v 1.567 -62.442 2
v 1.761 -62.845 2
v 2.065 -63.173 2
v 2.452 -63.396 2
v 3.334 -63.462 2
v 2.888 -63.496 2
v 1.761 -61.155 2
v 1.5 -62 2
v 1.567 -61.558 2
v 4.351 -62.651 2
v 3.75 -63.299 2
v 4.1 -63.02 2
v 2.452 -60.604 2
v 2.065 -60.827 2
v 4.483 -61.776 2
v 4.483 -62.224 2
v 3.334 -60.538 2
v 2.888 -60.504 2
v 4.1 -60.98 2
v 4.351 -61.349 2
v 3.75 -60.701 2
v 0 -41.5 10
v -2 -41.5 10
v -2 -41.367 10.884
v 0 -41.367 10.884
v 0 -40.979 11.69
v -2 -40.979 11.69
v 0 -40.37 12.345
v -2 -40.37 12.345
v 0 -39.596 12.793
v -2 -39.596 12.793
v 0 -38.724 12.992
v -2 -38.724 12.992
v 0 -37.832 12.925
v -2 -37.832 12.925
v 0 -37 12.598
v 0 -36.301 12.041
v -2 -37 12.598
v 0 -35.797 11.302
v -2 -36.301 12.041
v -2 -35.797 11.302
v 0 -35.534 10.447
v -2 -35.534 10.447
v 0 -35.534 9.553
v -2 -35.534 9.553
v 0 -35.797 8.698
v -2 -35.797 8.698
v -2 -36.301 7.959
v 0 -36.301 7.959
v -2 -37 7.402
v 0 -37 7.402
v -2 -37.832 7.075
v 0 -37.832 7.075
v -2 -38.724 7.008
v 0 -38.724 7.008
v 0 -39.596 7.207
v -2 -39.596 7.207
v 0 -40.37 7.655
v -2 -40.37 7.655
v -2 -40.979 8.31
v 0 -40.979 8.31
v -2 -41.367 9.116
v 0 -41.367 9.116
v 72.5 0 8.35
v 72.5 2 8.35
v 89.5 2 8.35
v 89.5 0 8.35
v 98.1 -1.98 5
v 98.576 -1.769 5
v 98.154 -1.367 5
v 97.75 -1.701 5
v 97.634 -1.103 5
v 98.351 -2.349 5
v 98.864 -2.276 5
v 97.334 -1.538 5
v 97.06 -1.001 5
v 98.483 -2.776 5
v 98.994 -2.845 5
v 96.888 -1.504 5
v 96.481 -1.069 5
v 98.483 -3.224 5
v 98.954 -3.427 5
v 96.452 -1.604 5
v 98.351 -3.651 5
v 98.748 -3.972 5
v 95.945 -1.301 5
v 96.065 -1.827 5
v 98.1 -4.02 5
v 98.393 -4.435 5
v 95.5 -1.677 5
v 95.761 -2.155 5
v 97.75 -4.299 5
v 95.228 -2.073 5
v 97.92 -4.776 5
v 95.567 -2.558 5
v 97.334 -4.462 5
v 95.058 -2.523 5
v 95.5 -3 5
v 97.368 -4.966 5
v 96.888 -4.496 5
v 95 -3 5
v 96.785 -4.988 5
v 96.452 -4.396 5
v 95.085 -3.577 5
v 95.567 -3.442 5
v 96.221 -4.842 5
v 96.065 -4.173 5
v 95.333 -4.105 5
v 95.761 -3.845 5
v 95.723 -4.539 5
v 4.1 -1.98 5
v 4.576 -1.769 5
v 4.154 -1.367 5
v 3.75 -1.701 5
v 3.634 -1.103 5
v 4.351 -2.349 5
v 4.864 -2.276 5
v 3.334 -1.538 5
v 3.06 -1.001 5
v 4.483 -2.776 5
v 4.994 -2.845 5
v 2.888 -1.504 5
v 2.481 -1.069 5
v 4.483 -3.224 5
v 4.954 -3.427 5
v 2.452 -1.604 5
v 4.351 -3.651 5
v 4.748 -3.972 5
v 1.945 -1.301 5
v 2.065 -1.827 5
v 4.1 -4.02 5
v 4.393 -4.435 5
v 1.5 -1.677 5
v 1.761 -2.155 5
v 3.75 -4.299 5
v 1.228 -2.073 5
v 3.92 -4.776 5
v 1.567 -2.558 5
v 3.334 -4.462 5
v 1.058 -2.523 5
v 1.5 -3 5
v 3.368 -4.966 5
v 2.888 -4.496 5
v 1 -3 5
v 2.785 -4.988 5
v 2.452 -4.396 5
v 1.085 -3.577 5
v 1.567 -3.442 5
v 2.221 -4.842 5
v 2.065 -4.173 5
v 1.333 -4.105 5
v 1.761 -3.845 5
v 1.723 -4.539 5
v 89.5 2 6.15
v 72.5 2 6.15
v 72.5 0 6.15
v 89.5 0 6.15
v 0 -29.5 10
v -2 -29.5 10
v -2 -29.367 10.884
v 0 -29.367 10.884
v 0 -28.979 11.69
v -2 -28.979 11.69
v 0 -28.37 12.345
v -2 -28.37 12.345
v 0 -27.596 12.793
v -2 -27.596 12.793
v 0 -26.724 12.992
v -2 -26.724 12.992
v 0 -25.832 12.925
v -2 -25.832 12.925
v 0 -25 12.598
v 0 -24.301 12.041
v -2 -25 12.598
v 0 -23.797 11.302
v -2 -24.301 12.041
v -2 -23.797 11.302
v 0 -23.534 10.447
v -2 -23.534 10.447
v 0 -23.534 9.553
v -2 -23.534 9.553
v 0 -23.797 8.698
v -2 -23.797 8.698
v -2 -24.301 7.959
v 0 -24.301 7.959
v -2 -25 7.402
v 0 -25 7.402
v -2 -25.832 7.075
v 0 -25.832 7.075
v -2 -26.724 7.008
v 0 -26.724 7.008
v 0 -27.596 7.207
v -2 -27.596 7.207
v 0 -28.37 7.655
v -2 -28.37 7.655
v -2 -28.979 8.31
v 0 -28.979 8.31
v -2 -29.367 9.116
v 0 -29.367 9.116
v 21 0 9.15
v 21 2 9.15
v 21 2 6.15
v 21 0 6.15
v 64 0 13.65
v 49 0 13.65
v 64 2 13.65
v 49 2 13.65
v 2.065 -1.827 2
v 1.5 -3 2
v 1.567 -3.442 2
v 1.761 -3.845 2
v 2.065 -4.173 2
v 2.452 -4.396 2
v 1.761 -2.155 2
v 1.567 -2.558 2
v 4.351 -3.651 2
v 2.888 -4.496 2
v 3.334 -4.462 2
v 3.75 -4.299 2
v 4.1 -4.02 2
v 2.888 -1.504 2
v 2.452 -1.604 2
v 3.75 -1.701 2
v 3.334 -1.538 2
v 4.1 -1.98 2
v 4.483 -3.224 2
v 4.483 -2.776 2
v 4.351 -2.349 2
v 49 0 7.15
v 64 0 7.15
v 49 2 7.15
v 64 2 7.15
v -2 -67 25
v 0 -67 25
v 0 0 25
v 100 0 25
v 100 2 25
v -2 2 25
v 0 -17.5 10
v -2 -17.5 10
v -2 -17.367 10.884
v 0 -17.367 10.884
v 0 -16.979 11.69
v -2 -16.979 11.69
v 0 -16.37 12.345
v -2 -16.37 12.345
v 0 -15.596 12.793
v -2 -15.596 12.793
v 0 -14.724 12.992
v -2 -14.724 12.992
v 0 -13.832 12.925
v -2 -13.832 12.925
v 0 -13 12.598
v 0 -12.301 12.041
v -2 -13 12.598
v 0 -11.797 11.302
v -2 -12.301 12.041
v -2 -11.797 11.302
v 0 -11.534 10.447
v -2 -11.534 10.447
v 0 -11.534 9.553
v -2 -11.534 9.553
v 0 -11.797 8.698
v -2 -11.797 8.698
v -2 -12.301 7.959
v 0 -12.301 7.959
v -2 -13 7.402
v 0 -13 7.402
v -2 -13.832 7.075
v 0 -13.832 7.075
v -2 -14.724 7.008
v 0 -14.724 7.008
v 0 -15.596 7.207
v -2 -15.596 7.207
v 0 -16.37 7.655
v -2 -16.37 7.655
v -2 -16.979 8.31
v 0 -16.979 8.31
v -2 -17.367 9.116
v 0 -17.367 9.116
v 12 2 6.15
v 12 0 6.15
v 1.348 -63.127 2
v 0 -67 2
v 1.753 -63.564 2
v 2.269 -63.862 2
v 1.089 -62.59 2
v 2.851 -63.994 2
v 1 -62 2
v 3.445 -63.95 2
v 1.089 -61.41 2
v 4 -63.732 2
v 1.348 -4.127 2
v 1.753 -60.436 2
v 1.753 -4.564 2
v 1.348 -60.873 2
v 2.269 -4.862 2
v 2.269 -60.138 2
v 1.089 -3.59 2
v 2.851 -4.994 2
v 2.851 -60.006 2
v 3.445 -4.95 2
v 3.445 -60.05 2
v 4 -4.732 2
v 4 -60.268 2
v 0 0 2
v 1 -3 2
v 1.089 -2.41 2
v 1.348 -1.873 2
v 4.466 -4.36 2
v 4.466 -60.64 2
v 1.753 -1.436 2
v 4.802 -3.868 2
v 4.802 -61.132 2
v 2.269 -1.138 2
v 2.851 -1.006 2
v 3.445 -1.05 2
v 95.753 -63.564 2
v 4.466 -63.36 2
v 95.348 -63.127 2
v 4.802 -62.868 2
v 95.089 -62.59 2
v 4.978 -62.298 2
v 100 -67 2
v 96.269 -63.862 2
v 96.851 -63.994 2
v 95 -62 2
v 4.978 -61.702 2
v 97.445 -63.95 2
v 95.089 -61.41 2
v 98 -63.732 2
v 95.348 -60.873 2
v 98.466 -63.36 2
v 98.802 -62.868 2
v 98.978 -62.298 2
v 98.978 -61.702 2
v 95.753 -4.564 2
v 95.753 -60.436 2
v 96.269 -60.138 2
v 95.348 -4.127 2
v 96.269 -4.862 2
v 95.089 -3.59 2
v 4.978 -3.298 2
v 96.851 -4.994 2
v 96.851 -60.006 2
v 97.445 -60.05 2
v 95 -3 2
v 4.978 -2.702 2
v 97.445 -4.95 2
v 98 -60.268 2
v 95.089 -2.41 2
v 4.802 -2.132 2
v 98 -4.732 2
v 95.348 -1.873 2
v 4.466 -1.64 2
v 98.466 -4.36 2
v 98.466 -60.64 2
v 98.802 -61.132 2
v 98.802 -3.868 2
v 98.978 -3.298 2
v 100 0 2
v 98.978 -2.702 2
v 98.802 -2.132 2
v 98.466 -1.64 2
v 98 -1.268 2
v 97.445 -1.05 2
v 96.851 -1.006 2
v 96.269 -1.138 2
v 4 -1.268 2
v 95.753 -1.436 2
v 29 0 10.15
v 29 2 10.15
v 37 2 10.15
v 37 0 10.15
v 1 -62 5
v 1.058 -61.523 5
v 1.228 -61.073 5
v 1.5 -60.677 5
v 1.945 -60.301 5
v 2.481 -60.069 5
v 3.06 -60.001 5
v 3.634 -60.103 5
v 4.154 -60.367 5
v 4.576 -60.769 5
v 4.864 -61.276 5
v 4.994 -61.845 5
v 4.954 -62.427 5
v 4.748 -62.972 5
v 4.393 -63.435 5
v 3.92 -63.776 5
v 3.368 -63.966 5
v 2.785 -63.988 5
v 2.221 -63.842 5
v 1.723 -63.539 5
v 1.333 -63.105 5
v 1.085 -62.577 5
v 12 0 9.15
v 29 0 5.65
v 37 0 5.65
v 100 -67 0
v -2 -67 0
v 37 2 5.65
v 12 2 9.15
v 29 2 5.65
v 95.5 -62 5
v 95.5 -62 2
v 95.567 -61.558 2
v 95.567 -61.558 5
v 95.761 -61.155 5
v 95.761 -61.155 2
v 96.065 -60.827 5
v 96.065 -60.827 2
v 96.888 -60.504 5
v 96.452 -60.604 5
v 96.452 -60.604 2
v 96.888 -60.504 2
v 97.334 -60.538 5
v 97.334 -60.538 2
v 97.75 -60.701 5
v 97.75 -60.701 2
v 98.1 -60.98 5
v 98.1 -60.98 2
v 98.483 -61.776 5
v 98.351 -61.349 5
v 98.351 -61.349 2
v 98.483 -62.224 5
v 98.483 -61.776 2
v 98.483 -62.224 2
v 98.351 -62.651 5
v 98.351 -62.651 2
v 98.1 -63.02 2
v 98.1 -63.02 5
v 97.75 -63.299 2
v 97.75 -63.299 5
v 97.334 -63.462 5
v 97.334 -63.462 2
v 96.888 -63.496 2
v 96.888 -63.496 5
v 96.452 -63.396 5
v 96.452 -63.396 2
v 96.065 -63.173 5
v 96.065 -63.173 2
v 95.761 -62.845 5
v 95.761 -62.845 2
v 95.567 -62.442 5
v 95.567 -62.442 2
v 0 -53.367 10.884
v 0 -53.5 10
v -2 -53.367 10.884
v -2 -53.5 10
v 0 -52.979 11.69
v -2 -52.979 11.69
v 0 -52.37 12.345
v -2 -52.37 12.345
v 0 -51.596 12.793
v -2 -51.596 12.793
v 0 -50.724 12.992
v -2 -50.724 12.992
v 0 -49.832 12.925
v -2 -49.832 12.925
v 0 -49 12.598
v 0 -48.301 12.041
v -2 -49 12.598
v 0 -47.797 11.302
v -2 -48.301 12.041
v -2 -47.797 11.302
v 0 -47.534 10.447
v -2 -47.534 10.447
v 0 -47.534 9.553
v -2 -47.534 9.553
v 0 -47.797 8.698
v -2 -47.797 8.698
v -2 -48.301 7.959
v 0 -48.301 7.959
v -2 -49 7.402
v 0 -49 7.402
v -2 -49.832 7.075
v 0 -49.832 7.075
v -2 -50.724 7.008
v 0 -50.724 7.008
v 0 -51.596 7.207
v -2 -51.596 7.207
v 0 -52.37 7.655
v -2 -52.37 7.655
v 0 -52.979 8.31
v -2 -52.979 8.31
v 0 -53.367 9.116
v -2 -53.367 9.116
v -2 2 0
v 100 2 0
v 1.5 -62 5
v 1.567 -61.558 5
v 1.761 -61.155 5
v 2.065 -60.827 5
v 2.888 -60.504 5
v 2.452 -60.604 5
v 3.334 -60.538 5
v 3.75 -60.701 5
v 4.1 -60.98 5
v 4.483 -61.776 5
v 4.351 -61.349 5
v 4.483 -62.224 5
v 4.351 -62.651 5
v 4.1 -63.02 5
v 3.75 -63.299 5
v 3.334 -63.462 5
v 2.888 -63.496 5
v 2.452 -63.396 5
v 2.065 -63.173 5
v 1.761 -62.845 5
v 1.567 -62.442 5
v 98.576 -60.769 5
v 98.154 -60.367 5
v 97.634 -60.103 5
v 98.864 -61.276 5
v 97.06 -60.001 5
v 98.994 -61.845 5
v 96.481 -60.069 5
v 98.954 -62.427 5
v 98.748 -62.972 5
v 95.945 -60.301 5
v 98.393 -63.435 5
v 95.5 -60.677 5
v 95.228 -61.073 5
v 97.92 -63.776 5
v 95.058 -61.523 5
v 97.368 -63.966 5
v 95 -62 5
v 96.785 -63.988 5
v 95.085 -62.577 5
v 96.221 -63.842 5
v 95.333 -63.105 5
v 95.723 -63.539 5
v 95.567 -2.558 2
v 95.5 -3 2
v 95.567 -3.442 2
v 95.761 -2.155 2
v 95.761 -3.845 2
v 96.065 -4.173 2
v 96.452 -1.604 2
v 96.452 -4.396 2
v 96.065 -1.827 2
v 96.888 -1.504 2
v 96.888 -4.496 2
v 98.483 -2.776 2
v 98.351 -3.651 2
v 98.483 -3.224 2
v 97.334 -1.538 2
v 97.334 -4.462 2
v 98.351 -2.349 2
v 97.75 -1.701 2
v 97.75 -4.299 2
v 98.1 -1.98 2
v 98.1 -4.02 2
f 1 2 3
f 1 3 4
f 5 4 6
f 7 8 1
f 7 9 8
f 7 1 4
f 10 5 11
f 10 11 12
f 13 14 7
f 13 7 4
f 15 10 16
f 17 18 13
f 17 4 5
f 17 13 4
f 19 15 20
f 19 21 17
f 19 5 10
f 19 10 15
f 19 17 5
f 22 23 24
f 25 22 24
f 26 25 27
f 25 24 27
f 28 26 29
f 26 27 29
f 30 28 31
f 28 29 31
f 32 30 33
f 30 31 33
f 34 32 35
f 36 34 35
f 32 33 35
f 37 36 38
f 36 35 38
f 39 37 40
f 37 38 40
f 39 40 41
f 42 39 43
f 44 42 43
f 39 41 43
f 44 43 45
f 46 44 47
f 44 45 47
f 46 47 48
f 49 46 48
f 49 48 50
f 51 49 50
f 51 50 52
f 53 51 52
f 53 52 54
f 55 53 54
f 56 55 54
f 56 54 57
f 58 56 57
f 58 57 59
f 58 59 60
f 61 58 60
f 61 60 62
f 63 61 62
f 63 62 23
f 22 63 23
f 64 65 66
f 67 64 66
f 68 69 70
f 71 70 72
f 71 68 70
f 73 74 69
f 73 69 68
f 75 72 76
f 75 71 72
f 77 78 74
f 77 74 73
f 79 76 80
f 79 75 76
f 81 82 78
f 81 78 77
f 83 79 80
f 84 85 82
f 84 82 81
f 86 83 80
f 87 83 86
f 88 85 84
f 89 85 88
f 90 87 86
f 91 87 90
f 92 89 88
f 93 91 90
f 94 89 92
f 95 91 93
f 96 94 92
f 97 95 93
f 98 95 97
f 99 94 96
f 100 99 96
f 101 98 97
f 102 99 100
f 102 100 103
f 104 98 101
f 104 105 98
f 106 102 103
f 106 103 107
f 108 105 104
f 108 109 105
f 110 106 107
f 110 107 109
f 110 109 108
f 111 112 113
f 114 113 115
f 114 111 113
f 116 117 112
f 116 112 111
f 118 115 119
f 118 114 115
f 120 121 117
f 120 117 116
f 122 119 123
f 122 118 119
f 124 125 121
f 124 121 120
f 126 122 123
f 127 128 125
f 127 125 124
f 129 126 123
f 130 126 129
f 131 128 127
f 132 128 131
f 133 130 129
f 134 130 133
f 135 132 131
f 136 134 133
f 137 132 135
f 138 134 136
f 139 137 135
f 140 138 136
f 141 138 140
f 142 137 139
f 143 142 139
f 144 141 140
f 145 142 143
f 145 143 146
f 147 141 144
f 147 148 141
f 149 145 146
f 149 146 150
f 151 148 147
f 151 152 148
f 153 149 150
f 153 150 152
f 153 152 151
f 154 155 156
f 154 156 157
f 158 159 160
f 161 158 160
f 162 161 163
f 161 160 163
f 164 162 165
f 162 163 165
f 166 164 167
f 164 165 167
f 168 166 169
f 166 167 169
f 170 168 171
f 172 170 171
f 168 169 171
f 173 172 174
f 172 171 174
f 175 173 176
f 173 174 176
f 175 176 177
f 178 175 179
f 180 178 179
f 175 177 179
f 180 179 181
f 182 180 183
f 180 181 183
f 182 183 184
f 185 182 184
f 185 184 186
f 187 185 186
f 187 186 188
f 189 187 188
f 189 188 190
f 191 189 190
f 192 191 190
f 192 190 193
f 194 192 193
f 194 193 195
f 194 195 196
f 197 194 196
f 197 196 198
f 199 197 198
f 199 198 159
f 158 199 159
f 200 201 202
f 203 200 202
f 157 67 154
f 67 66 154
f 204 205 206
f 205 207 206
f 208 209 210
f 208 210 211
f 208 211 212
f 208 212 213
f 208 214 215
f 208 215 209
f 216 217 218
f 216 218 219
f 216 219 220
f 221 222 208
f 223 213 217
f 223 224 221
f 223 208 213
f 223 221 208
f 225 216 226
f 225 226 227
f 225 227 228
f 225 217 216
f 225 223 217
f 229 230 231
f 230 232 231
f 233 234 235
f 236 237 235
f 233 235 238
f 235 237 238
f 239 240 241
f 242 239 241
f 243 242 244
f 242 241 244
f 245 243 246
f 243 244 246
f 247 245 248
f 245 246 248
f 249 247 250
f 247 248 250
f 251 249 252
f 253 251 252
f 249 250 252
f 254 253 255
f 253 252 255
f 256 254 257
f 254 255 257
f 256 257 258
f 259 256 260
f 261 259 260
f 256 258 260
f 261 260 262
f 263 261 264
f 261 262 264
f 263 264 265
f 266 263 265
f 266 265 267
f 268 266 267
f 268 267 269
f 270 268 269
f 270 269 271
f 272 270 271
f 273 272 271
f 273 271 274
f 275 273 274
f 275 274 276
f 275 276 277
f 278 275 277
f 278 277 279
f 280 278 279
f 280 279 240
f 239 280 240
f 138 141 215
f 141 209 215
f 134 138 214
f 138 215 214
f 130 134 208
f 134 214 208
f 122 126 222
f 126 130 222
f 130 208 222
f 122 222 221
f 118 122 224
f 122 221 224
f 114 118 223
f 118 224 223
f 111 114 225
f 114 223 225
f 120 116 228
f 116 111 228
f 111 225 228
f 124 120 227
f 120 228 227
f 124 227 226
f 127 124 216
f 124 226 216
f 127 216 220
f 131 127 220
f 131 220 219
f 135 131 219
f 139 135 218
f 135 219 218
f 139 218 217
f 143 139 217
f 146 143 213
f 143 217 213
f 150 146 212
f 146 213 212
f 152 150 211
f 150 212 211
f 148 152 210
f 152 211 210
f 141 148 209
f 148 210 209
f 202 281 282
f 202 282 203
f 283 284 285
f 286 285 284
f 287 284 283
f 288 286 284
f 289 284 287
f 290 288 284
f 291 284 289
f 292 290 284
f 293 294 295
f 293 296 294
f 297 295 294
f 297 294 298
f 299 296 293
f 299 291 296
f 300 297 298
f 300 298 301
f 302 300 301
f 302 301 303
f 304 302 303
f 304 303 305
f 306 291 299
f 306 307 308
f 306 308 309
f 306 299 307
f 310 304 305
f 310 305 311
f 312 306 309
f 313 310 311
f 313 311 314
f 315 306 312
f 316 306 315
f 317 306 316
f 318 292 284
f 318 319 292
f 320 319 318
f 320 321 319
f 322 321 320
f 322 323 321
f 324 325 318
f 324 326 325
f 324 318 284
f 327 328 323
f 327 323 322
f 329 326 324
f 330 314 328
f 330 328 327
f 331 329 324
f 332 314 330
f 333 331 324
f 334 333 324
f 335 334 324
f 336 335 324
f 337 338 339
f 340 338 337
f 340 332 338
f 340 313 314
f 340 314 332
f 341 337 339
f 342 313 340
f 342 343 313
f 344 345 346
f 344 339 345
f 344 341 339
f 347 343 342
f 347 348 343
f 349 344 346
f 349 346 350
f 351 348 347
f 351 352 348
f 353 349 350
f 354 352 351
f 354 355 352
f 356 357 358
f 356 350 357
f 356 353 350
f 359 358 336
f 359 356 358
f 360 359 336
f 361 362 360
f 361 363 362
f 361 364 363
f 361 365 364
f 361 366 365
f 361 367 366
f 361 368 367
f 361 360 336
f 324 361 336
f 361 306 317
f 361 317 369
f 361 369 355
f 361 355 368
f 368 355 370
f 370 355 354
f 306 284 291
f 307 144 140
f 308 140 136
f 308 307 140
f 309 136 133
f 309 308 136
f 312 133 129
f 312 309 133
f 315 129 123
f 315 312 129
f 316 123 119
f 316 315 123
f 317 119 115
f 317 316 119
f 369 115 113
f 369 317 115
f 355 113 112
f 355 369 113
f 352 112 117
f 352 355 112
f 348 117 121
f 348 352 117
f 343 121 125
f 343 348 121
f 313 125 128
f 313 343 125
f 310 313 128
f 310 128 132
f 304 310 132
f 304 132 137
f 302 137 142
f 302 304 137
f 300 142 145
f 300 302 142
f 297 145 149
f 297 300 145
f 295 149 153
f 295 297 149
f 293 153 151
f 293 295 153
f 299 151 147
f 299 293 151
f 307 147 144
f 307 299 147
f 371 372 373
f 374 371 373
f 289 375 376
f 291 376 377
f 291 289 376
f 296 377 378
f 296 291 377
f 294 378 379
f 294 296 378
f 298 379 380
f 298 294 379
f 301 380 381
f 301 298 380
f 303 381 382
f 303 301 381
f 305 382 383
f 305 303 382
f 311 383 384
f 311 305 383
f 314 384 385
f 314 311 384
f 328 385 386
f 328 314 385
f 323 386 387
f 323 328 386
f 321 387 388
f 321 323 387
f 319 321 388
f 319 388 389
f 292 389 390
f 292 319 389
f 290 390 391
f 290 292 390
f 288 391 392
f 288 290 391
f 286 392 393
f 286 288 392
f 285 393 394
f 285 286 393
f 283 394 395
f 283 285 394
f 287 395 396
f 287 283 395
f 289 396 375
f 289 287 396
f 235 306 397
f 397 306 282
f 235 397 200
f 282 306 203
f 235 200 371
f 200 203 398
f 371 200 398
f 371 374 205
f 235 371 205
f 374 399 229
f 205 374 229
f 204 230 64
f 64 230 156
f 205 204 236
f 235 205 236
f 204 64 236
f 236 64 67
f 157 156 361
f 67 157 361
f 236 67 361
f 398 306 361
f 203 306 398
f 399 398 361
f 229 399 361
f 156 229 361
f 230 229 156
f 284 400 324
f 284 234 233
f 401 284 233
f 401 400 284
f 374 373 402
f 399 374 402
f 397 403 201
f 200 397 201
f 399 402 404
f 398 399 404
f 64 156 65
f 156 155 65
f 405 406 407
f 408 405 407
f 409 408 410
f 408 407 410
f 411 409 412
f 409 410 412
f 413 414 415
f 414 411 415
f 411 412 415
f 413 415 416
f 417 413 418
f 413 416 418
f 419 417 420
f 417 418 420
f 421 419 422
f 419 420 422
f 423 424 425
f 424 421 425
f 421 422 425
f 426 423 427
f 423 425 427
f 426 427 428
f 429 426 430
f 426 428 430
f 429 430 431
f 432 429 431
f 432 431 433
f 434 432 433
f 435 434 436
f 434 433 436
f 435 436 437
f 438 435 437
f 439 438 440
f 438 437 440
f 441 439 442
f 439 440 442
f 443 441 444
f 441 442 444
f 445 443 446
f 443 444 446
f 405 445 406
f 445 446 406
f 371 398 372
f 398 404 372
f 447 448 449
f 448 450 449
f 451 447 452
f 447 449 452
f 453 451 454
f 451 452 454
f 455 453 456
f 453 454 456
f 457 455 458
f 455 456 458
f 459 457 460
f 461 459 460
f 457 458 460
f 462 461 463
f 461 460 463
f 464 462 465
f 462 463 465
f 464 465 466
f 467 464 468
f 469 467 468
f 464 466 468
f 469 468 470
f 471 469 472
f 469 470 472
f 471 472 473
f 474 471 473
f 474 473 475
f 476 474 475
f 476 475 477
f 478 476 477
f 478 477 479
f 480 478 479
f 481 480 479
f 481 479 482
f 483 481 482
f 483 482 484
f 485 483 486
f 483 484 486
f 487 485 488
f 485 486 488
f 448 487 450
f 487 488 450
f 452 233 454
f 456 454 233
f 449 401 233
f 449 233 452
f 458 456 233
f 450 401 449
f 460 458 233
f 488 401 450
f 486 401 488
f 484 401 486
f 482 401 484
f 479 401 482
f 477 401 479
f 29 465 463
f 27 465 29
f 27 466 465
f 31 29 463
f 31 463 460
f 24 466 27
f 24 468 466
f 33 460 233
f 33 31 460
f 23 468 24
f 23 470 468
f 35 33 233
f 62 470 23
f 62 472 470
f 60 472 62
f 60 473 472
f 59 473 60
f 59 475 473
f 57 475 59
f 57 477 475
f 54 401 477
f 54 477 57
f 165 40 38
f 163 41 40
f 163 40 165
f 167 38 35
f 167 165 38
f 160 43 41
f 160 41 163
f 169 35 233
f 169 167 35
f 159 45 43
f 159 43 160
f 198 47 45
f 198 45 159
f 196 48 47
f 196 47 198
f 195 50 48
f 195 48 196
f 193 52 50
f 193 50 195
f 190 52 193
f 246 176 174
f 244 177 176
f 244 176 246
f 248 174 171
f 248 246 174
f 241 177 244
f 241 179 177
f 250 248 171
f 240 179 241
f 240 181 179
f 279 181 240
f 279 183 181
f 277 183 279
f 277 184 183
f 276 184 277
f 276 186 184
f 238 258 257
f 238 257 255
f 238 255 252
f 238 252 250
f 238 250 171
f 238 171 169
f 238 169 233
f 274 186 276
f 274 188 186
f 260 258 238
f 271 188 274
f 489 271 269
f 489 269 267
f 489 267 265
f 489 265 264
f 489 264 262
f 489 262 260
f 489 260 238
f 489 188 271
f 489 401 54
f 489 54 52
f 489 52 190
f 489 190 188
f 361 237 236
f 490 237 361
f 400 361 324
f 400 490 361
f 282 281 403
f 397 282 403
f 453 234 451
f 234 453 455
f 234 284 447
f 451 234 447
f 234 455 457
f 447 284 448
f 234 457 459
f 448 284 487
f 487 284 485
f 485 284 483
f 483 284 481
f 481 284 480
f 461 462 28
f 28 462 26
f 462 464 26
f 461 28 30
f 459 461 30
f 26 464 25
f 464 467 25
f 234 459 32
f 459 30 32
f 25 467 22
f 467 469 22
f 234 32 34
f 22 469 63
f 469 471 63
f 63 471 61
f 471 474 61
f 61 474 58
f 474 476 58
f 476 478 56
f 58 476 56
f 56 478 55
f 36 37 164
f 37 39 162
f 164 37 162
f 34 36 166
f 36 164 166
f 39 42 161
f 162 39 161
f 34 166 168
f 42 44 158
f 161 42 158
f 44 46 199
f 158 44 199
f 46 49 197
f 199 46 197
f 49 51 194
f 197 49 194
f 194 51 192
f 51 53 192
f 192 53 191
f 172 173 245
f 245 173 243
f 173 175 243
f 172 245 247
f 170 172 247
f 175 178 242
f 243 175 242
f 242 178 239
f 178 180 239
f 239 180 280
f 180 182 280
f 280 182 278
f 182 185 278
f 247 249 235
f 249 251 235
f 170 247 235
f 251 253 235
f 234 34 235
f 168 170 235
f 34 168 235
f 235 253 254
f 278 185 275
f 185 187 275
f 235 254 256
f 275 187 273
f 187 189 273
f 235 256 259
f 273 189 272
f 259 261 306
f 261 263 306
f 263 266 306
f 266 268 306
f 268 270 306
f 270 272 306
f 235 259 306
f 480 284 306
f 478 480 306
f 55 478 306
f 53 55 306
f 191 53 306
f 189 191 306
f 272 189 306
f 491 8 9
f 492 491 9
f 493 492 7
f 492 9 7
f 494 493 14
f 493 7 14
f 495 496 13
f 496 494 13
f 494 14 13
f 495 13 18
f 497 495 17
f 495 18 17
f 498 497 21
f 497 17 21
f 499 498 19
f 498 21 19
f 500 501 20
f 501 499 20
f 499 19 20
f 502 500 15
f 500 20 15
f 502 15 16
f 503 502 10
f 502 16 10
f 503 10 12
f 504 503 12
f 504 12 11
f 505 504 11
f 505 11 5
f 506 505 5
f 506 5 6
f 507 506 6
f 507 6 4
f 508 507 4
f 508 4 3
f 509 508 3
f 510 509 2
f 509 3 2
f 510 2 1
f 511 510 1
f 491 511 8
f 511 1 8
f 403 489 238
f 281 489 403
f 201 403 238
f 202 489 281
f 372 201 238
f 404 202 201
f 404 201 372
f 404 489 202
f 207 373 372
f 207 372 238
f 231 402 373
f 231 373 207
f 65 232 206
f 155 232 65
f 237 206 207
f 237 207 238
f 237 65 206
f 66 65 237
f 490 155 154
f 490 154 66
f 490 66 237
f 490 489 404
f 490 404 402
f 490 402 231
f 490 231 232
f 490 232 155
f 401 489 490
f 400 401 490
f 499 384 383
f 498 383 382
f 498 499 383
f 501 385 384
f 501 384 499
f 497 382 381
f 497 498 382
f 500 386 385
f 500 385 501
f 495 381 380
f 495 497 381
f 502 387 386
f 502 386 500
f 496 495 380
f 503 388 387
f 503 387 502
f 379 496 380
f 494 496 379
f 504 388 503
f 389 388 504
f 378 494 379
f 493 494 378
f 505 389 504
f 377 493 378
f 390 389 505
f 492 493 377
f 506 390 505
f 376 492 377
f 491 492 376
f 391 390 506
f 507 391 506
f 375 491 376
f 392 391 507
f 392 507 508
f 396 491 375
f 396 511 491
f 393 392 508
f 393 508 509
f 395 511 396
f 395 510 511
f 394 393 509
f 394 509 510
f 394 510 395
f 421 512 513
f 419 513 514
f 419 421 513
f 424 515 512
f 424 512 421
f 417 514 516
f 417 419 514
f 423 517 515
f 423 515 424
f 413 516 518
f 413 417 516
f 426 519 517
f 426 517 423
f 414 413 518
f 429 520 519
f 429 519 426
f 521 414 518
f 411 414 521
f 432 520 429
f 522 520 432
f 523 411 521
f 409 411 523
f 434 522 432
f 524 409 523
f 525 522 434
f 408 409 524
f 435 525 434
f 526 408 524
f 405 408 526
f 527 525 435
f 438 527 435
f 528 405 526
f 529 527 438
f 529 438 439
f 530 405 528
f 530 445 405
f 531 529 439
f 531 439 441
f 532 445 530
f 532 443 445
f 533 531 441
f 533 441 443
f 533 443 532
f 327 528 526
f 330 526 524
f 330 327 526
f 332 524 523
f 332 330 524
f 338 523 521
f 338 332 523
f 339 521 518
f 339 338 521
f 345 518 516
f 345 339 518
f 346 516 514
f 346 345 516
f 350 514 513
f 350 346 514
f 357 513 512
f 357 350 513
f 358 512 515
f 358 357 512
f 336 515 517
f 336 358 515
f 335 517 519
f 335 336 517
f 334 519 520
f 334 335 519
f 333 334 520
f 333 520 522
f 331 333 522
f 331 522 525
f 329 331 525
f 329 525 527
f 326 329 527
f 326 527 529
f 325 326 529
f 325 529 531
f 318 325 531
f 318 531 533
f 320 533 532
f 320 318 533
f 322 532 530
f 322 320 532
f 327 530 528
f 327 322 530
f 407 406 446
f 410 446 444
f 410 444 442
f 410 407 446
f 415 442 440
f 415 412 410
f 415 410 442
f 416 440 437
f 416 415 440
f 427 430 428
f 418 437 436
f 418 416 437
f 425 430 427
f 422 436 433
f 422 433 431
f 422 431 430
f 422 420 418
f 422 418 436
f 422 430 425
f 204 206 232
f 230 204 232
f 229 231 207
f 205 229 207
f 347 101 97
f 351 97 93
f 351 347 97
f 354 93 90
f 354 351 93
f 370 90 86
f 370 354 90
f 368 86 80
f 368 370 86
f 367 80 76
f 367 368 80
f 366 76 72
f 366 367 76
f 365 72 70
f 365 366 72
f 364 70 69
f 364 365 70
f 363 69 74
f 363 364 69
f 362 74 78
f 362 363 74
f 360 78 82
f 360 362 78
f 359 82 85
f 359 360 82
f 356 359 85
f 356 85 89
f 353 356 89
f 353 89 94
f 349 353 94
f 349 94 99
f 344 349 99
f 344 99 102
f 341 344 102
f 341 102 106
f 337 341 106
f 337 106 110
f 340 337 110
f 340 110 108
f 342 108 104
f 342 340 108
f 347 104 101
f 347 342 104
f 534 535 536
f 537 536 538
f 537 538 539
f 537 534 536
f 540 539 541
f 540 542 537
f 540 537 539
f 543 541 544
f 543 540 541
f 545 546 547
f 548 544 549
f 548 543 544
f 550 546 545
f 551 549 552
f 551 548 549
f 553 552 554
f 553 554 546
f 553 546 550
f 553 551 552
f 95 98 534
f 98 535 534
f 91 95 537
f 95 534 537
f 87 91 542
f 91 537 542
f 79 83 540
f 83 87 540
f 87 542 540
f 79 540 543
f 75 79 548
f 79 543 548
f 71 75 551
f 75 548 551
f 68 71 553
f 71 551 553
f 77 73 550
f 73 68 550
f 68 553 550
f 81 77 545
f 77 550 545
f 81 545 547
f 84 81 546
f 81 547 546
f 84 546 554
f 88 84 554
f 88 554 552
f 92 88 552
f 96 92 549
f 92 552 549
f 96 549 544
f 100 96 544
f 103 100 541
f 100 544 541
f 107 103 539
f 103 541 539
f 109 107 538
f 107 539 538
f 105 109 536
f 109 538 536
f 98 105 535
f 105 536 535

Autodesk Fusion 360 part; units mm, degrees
sketch "Sketch1" plane through (0, 0, 0) normal (0, 0, 1) x (1, 0, 0)
  line L0 (0, 0) -> (100, 0)
  line L1 (100, 0) -> (100, -65)
  line L2 (100, -65) -> (0, -65)
  line L3 (0, -65) -> (0, 0)
  dimension "d1" = 100
  dimension "d2" = 65
extrude "Extrude1" add sketch "Sketch1" along normal blind 2
sketch "Sketch2" plane through (0, 0, 2) normal (0, 0, 1) x (-1, 0, 0)
  line L0 (0, 65) -> (-100, 65)
  line L1 (-100, 65) -> (-100, 0)
  line L2 (-100, 0) -> (0, 0)
  line L3 (0, 0) -> (0, 65)
  line L4 (0, 65) -> (-120, 65)
  line L5 (-120, 65) -> (-210, 65)
  line L6 (-210, 65) -> (-290, 65)
  line L7 (-290, 65) -> (-370, 65)
  line L8 (-370, 65) -> (-490, 65)
  line L9 (-490, 65) -> (-640, 65)
  line L10 (-640, 65) -> (-725, 65)
  line L11 (-725, 65) -> (-895, 65)
  line L12 (-895, 65) -> (-1000, 65)
  line L13 (0, 0) -> (-1.5, 0)
  line L14 (-1.5, 0) -> (-1.5, 1.5)
  line L15 (-1.5, 1.5) -> (-1.5, 3)
  line L16 (-1.5, 3) -> (-3, 3)
  circle A0 centre (-3, 3) radius 1.5
  circle A1 centre (-3, 3) radius 2
  dimension "d5" = 120
  dimension "d6" = 90
  dimension "d7" = 80
  dimension "d8" = 80
  dimension "d9" = 120
  dimension "d10" = 150
  dimension "d11" = 85
  dimension "d12" = 170
  dimension "d13" = 105
  dimension "d14" = 1.5
  dimension "d15" = 1.5
  dimension "d16" = 1.5
  dimension "d17" = 1.5
  dimension "d18" = 3
extrude "Extrude2" add sketch "Sketch2" along normal blind 3 contours A1
pattern_linear "R-Pattern2" count 2 spacing 94 along (1, 0, 0) count 2 spacing 59 along (0, -1, 0) of "Extrude2"
sketch "Sketch4" plane through (0, 0, 0) normal (0, 0, -1) x (1, 0, 0)
  line L0 (100, 65) -> (0, 65)
  line L1 (0, 65) -> (0, 0)
  line L2 (0, 0) -> (100, 0)
  line L3 (100, 0) -> (100, 65)
  line L4 (0, 0) -> (-2, 0)
  line L5 (-2, 0) -> (-2, 65)
  line L6 (-2, 65) -> (0, 65)
  line L7 (0, 65) -> (0, 0)
  line L8 (-2, 65) -> (100, 65)
  line L9 (100, 65) -> (100, 67)
  line L10 (100, 67) -> (-2, 67)
  line L11 (-2, 67) -> (-2, 65)
  dimension "d37" = 2
  dimension "d38" = 2
extrude "Extrude6" add sketch "Sketch4" against normal blind 25 contours L0 L6 L8 L9 L10 L11 | L1 L4 L5 L6 L7 L8
sketch "Sketch5" plane through (0, -67, 0) normal (0, -1, 0) x (1, 0, 0)
  line L0 (-2, 0) -> (100, 0)
  line L1 (100, 0) -> (100, 25)
  line L2 (100, 25) -> (-2, 25)
  line L3 (-2, 25) -> (-2, 0)
  line L4 (0, 25) -> (0, 0) construction
  line L5 (0, 5) -> (100, 5) construction
  line L6 (0, 5) -> (100, 5)
  line L7 (100, 5) -> (100, 6.15)
  line L8 (100, 6.15) -> (0, 6.15)
  line L9 (0, 6.15) -> (0, 5)
  line L10 (0, 6.15) -> (12, 6.15)
  line L11 (12, 6.15) -> (21, 6.15)
  line L12 (21, 6.15) -> (21, 9.15)
  line L13 (21, 9.15) -> (12, 9.15)
  line L14 (12, 9.15) -> (12, 6.15)
  line L15 (21, 6.15) -> (29, 6.15)
  line L16 (29, 6.15) -> (37, 6.15)
  line L17 (37, 6.15) -> (37, 10.15)
  line L18 (37, 10.15) -> (29, 10.15)
  line L19 (29, 10.15) -> (29, 6.15)
  line L20 (37, 6.15) -> (49, 6.15)
  line L21 (49, 6.15) -> (64, 6.15)
  line L22 (64, 6.15) -> (64, 13.65)
  line L23 (64, 13.65) -> (49, 13.65)
  line L24 (49, 13.65) -> (49, 6.15)
  line L25 (64, 6.15) -> (72.5, 6.15)
  line L26 (72.5, 6.15) -> (89.5, 6.15)
  line L27 (89.5, 6.15) -> (89.5, 8.35)
  line L28 (89.5, 8.35) -> (72.5, 8.35)
  line L29 (72.5, 8.35) -> (72.5, 6.15)
  line L30 (89.5, 6.15) -> (100, 6.15)
  line L31 (49, 6.15) -> (49, 7.15)
  line L32 (49, 7.15) -> (64, 7.15)
  line L33 (29, 6.15) -> (29, 5.65)
  line L34 (29, 5.65) -> (37, 5.65)
  line L35 (37, 5.65) -> (37, 6.15)
  dimension "d41" = 1.15
  dimension "d42" = 12
  dimension "d43" = 9
  dimension "d44" = 3
  dimension "d45" = 8
  dimension "d46" = 8
  dimension "d47" = 4
  dimension "d48" = 12
  dimension "d49" = 15
  dimension "d50" = 7.5
  dimension "d51" = 8.5
  dimension "d52" = 17
  dimension "d53" = 2.2
  dimension "d73" = 1
  dimension "d74" = 0.5
extrude "Extrude7" cut sketch "Sketch5" against normal up to surface (2 mm away) contours L8 L26 L27 L28 L29 | L8 L11 L12 L13 L14 | L22 L23 L24 L32 | L8 L16 L17 L18 L19 | L8 L16 L33 L34 L35
sketch "Sketch6" plane through (-2, 0, 0) normal (-1, 0, 0) x (0, -1, 0)
  line L0 (0, 0) -> (67, 0)
  line L1 (67, 0) -> (67, 25)
  line L2 (67, 25) -> (0, 25)
  line L3 (0, 25) -> (0, 0)
  line L4 (65, 25) -> (65, 0)
  line L5 (67, 5) -> (0, 5)
  line L6 (67, 5) -> (0, 5)
  line L7 (0, 5) -> (0, 6.15)
  line L8 (0, 6.15) -> (67, 6.15) construction
  line L9 (67, 6.15) -> (67, 5)
  line L10 (65, 5) -> (65, 10)
  line L11 (65, 10) -> (0, 10)
  line L12 (65, 10) -> (50.5, 10)
  circle A0 centre (50.5, 10) radius 3
  line L13 (50.5, 10) -> (38.5, 10)
  circle A1 centre (38.5, 10) radius 3
  line L14 (38.5, 10) -> (26.5, 10)
  circle A2 centre (26.5, 10) radius 3
  line L15 (26.5, 10) -> (14.5, 10)
  circle A3 centre (14.5, 10) radius 3
  dimension "d56" = 67
  dimension "d57" = 1.15
  dimension "d58" = 5
  dimension "d59" = 14.5
  dimension "d60" = 6
  dimension "d61" = 12
  dimension "d62" = 12
  dimension "d63" = 12
ref_plane "WorkPlane1" through (50, -32.5, 13.5) normal (0, 1, 0) x (-1, 0, 0)
mirror "Mirror1" about plane through (50, -32.5, 13.5) normal (0, 1, 0) of "Extrude6"
extrude "Extrude8" cut sketch "Sketch6" against normal up to surface (2 mm away) contours L11 L12 A0 L13 | L11 L12 A0 L13 | L11 L15 A3 | L11 L15 A3 | L11 L13 A1 L14 | L11 L13 A1 L14 | L11 L14 A2 L15 | L11 L14 A2 L15
mirror "Mirror2" about plane through (50, -32.5, 13.5) normal (0, 1, 0) of "Extrude7"
sketch "Sketch7" plane through (0, 0, 25) normal (0, 0, 1) x (-1, 0, 0)
  line L0 (2, -2) -> (2, 67)
  line L1 (2, 67) -> (-100, 67)
  line L2 (-100, 67) -> (-100, 65)
  line L3 (-100, 65) -> (0, 65)
  line L4 (0, 65) -> (0, 0)
  line L5 (0, 0) -> (-100, 0)
  line L6 (-100, 0) -> (-100, -2)
  line L7 (-100, -2) -> (2, -2)
  line L8 (0, 65) -> (-100, 65)
  line L9 (-100, 65) -> (-100, 67)
  line L10 (-100, 67) -> (0, 67)
  line L11 (0, 67) -> (0, 65)
extrude "Extrude9" cut sketch "Sketch7" against normal blind 23 contours L1 L2 L3 L8 L9 L10 L11
